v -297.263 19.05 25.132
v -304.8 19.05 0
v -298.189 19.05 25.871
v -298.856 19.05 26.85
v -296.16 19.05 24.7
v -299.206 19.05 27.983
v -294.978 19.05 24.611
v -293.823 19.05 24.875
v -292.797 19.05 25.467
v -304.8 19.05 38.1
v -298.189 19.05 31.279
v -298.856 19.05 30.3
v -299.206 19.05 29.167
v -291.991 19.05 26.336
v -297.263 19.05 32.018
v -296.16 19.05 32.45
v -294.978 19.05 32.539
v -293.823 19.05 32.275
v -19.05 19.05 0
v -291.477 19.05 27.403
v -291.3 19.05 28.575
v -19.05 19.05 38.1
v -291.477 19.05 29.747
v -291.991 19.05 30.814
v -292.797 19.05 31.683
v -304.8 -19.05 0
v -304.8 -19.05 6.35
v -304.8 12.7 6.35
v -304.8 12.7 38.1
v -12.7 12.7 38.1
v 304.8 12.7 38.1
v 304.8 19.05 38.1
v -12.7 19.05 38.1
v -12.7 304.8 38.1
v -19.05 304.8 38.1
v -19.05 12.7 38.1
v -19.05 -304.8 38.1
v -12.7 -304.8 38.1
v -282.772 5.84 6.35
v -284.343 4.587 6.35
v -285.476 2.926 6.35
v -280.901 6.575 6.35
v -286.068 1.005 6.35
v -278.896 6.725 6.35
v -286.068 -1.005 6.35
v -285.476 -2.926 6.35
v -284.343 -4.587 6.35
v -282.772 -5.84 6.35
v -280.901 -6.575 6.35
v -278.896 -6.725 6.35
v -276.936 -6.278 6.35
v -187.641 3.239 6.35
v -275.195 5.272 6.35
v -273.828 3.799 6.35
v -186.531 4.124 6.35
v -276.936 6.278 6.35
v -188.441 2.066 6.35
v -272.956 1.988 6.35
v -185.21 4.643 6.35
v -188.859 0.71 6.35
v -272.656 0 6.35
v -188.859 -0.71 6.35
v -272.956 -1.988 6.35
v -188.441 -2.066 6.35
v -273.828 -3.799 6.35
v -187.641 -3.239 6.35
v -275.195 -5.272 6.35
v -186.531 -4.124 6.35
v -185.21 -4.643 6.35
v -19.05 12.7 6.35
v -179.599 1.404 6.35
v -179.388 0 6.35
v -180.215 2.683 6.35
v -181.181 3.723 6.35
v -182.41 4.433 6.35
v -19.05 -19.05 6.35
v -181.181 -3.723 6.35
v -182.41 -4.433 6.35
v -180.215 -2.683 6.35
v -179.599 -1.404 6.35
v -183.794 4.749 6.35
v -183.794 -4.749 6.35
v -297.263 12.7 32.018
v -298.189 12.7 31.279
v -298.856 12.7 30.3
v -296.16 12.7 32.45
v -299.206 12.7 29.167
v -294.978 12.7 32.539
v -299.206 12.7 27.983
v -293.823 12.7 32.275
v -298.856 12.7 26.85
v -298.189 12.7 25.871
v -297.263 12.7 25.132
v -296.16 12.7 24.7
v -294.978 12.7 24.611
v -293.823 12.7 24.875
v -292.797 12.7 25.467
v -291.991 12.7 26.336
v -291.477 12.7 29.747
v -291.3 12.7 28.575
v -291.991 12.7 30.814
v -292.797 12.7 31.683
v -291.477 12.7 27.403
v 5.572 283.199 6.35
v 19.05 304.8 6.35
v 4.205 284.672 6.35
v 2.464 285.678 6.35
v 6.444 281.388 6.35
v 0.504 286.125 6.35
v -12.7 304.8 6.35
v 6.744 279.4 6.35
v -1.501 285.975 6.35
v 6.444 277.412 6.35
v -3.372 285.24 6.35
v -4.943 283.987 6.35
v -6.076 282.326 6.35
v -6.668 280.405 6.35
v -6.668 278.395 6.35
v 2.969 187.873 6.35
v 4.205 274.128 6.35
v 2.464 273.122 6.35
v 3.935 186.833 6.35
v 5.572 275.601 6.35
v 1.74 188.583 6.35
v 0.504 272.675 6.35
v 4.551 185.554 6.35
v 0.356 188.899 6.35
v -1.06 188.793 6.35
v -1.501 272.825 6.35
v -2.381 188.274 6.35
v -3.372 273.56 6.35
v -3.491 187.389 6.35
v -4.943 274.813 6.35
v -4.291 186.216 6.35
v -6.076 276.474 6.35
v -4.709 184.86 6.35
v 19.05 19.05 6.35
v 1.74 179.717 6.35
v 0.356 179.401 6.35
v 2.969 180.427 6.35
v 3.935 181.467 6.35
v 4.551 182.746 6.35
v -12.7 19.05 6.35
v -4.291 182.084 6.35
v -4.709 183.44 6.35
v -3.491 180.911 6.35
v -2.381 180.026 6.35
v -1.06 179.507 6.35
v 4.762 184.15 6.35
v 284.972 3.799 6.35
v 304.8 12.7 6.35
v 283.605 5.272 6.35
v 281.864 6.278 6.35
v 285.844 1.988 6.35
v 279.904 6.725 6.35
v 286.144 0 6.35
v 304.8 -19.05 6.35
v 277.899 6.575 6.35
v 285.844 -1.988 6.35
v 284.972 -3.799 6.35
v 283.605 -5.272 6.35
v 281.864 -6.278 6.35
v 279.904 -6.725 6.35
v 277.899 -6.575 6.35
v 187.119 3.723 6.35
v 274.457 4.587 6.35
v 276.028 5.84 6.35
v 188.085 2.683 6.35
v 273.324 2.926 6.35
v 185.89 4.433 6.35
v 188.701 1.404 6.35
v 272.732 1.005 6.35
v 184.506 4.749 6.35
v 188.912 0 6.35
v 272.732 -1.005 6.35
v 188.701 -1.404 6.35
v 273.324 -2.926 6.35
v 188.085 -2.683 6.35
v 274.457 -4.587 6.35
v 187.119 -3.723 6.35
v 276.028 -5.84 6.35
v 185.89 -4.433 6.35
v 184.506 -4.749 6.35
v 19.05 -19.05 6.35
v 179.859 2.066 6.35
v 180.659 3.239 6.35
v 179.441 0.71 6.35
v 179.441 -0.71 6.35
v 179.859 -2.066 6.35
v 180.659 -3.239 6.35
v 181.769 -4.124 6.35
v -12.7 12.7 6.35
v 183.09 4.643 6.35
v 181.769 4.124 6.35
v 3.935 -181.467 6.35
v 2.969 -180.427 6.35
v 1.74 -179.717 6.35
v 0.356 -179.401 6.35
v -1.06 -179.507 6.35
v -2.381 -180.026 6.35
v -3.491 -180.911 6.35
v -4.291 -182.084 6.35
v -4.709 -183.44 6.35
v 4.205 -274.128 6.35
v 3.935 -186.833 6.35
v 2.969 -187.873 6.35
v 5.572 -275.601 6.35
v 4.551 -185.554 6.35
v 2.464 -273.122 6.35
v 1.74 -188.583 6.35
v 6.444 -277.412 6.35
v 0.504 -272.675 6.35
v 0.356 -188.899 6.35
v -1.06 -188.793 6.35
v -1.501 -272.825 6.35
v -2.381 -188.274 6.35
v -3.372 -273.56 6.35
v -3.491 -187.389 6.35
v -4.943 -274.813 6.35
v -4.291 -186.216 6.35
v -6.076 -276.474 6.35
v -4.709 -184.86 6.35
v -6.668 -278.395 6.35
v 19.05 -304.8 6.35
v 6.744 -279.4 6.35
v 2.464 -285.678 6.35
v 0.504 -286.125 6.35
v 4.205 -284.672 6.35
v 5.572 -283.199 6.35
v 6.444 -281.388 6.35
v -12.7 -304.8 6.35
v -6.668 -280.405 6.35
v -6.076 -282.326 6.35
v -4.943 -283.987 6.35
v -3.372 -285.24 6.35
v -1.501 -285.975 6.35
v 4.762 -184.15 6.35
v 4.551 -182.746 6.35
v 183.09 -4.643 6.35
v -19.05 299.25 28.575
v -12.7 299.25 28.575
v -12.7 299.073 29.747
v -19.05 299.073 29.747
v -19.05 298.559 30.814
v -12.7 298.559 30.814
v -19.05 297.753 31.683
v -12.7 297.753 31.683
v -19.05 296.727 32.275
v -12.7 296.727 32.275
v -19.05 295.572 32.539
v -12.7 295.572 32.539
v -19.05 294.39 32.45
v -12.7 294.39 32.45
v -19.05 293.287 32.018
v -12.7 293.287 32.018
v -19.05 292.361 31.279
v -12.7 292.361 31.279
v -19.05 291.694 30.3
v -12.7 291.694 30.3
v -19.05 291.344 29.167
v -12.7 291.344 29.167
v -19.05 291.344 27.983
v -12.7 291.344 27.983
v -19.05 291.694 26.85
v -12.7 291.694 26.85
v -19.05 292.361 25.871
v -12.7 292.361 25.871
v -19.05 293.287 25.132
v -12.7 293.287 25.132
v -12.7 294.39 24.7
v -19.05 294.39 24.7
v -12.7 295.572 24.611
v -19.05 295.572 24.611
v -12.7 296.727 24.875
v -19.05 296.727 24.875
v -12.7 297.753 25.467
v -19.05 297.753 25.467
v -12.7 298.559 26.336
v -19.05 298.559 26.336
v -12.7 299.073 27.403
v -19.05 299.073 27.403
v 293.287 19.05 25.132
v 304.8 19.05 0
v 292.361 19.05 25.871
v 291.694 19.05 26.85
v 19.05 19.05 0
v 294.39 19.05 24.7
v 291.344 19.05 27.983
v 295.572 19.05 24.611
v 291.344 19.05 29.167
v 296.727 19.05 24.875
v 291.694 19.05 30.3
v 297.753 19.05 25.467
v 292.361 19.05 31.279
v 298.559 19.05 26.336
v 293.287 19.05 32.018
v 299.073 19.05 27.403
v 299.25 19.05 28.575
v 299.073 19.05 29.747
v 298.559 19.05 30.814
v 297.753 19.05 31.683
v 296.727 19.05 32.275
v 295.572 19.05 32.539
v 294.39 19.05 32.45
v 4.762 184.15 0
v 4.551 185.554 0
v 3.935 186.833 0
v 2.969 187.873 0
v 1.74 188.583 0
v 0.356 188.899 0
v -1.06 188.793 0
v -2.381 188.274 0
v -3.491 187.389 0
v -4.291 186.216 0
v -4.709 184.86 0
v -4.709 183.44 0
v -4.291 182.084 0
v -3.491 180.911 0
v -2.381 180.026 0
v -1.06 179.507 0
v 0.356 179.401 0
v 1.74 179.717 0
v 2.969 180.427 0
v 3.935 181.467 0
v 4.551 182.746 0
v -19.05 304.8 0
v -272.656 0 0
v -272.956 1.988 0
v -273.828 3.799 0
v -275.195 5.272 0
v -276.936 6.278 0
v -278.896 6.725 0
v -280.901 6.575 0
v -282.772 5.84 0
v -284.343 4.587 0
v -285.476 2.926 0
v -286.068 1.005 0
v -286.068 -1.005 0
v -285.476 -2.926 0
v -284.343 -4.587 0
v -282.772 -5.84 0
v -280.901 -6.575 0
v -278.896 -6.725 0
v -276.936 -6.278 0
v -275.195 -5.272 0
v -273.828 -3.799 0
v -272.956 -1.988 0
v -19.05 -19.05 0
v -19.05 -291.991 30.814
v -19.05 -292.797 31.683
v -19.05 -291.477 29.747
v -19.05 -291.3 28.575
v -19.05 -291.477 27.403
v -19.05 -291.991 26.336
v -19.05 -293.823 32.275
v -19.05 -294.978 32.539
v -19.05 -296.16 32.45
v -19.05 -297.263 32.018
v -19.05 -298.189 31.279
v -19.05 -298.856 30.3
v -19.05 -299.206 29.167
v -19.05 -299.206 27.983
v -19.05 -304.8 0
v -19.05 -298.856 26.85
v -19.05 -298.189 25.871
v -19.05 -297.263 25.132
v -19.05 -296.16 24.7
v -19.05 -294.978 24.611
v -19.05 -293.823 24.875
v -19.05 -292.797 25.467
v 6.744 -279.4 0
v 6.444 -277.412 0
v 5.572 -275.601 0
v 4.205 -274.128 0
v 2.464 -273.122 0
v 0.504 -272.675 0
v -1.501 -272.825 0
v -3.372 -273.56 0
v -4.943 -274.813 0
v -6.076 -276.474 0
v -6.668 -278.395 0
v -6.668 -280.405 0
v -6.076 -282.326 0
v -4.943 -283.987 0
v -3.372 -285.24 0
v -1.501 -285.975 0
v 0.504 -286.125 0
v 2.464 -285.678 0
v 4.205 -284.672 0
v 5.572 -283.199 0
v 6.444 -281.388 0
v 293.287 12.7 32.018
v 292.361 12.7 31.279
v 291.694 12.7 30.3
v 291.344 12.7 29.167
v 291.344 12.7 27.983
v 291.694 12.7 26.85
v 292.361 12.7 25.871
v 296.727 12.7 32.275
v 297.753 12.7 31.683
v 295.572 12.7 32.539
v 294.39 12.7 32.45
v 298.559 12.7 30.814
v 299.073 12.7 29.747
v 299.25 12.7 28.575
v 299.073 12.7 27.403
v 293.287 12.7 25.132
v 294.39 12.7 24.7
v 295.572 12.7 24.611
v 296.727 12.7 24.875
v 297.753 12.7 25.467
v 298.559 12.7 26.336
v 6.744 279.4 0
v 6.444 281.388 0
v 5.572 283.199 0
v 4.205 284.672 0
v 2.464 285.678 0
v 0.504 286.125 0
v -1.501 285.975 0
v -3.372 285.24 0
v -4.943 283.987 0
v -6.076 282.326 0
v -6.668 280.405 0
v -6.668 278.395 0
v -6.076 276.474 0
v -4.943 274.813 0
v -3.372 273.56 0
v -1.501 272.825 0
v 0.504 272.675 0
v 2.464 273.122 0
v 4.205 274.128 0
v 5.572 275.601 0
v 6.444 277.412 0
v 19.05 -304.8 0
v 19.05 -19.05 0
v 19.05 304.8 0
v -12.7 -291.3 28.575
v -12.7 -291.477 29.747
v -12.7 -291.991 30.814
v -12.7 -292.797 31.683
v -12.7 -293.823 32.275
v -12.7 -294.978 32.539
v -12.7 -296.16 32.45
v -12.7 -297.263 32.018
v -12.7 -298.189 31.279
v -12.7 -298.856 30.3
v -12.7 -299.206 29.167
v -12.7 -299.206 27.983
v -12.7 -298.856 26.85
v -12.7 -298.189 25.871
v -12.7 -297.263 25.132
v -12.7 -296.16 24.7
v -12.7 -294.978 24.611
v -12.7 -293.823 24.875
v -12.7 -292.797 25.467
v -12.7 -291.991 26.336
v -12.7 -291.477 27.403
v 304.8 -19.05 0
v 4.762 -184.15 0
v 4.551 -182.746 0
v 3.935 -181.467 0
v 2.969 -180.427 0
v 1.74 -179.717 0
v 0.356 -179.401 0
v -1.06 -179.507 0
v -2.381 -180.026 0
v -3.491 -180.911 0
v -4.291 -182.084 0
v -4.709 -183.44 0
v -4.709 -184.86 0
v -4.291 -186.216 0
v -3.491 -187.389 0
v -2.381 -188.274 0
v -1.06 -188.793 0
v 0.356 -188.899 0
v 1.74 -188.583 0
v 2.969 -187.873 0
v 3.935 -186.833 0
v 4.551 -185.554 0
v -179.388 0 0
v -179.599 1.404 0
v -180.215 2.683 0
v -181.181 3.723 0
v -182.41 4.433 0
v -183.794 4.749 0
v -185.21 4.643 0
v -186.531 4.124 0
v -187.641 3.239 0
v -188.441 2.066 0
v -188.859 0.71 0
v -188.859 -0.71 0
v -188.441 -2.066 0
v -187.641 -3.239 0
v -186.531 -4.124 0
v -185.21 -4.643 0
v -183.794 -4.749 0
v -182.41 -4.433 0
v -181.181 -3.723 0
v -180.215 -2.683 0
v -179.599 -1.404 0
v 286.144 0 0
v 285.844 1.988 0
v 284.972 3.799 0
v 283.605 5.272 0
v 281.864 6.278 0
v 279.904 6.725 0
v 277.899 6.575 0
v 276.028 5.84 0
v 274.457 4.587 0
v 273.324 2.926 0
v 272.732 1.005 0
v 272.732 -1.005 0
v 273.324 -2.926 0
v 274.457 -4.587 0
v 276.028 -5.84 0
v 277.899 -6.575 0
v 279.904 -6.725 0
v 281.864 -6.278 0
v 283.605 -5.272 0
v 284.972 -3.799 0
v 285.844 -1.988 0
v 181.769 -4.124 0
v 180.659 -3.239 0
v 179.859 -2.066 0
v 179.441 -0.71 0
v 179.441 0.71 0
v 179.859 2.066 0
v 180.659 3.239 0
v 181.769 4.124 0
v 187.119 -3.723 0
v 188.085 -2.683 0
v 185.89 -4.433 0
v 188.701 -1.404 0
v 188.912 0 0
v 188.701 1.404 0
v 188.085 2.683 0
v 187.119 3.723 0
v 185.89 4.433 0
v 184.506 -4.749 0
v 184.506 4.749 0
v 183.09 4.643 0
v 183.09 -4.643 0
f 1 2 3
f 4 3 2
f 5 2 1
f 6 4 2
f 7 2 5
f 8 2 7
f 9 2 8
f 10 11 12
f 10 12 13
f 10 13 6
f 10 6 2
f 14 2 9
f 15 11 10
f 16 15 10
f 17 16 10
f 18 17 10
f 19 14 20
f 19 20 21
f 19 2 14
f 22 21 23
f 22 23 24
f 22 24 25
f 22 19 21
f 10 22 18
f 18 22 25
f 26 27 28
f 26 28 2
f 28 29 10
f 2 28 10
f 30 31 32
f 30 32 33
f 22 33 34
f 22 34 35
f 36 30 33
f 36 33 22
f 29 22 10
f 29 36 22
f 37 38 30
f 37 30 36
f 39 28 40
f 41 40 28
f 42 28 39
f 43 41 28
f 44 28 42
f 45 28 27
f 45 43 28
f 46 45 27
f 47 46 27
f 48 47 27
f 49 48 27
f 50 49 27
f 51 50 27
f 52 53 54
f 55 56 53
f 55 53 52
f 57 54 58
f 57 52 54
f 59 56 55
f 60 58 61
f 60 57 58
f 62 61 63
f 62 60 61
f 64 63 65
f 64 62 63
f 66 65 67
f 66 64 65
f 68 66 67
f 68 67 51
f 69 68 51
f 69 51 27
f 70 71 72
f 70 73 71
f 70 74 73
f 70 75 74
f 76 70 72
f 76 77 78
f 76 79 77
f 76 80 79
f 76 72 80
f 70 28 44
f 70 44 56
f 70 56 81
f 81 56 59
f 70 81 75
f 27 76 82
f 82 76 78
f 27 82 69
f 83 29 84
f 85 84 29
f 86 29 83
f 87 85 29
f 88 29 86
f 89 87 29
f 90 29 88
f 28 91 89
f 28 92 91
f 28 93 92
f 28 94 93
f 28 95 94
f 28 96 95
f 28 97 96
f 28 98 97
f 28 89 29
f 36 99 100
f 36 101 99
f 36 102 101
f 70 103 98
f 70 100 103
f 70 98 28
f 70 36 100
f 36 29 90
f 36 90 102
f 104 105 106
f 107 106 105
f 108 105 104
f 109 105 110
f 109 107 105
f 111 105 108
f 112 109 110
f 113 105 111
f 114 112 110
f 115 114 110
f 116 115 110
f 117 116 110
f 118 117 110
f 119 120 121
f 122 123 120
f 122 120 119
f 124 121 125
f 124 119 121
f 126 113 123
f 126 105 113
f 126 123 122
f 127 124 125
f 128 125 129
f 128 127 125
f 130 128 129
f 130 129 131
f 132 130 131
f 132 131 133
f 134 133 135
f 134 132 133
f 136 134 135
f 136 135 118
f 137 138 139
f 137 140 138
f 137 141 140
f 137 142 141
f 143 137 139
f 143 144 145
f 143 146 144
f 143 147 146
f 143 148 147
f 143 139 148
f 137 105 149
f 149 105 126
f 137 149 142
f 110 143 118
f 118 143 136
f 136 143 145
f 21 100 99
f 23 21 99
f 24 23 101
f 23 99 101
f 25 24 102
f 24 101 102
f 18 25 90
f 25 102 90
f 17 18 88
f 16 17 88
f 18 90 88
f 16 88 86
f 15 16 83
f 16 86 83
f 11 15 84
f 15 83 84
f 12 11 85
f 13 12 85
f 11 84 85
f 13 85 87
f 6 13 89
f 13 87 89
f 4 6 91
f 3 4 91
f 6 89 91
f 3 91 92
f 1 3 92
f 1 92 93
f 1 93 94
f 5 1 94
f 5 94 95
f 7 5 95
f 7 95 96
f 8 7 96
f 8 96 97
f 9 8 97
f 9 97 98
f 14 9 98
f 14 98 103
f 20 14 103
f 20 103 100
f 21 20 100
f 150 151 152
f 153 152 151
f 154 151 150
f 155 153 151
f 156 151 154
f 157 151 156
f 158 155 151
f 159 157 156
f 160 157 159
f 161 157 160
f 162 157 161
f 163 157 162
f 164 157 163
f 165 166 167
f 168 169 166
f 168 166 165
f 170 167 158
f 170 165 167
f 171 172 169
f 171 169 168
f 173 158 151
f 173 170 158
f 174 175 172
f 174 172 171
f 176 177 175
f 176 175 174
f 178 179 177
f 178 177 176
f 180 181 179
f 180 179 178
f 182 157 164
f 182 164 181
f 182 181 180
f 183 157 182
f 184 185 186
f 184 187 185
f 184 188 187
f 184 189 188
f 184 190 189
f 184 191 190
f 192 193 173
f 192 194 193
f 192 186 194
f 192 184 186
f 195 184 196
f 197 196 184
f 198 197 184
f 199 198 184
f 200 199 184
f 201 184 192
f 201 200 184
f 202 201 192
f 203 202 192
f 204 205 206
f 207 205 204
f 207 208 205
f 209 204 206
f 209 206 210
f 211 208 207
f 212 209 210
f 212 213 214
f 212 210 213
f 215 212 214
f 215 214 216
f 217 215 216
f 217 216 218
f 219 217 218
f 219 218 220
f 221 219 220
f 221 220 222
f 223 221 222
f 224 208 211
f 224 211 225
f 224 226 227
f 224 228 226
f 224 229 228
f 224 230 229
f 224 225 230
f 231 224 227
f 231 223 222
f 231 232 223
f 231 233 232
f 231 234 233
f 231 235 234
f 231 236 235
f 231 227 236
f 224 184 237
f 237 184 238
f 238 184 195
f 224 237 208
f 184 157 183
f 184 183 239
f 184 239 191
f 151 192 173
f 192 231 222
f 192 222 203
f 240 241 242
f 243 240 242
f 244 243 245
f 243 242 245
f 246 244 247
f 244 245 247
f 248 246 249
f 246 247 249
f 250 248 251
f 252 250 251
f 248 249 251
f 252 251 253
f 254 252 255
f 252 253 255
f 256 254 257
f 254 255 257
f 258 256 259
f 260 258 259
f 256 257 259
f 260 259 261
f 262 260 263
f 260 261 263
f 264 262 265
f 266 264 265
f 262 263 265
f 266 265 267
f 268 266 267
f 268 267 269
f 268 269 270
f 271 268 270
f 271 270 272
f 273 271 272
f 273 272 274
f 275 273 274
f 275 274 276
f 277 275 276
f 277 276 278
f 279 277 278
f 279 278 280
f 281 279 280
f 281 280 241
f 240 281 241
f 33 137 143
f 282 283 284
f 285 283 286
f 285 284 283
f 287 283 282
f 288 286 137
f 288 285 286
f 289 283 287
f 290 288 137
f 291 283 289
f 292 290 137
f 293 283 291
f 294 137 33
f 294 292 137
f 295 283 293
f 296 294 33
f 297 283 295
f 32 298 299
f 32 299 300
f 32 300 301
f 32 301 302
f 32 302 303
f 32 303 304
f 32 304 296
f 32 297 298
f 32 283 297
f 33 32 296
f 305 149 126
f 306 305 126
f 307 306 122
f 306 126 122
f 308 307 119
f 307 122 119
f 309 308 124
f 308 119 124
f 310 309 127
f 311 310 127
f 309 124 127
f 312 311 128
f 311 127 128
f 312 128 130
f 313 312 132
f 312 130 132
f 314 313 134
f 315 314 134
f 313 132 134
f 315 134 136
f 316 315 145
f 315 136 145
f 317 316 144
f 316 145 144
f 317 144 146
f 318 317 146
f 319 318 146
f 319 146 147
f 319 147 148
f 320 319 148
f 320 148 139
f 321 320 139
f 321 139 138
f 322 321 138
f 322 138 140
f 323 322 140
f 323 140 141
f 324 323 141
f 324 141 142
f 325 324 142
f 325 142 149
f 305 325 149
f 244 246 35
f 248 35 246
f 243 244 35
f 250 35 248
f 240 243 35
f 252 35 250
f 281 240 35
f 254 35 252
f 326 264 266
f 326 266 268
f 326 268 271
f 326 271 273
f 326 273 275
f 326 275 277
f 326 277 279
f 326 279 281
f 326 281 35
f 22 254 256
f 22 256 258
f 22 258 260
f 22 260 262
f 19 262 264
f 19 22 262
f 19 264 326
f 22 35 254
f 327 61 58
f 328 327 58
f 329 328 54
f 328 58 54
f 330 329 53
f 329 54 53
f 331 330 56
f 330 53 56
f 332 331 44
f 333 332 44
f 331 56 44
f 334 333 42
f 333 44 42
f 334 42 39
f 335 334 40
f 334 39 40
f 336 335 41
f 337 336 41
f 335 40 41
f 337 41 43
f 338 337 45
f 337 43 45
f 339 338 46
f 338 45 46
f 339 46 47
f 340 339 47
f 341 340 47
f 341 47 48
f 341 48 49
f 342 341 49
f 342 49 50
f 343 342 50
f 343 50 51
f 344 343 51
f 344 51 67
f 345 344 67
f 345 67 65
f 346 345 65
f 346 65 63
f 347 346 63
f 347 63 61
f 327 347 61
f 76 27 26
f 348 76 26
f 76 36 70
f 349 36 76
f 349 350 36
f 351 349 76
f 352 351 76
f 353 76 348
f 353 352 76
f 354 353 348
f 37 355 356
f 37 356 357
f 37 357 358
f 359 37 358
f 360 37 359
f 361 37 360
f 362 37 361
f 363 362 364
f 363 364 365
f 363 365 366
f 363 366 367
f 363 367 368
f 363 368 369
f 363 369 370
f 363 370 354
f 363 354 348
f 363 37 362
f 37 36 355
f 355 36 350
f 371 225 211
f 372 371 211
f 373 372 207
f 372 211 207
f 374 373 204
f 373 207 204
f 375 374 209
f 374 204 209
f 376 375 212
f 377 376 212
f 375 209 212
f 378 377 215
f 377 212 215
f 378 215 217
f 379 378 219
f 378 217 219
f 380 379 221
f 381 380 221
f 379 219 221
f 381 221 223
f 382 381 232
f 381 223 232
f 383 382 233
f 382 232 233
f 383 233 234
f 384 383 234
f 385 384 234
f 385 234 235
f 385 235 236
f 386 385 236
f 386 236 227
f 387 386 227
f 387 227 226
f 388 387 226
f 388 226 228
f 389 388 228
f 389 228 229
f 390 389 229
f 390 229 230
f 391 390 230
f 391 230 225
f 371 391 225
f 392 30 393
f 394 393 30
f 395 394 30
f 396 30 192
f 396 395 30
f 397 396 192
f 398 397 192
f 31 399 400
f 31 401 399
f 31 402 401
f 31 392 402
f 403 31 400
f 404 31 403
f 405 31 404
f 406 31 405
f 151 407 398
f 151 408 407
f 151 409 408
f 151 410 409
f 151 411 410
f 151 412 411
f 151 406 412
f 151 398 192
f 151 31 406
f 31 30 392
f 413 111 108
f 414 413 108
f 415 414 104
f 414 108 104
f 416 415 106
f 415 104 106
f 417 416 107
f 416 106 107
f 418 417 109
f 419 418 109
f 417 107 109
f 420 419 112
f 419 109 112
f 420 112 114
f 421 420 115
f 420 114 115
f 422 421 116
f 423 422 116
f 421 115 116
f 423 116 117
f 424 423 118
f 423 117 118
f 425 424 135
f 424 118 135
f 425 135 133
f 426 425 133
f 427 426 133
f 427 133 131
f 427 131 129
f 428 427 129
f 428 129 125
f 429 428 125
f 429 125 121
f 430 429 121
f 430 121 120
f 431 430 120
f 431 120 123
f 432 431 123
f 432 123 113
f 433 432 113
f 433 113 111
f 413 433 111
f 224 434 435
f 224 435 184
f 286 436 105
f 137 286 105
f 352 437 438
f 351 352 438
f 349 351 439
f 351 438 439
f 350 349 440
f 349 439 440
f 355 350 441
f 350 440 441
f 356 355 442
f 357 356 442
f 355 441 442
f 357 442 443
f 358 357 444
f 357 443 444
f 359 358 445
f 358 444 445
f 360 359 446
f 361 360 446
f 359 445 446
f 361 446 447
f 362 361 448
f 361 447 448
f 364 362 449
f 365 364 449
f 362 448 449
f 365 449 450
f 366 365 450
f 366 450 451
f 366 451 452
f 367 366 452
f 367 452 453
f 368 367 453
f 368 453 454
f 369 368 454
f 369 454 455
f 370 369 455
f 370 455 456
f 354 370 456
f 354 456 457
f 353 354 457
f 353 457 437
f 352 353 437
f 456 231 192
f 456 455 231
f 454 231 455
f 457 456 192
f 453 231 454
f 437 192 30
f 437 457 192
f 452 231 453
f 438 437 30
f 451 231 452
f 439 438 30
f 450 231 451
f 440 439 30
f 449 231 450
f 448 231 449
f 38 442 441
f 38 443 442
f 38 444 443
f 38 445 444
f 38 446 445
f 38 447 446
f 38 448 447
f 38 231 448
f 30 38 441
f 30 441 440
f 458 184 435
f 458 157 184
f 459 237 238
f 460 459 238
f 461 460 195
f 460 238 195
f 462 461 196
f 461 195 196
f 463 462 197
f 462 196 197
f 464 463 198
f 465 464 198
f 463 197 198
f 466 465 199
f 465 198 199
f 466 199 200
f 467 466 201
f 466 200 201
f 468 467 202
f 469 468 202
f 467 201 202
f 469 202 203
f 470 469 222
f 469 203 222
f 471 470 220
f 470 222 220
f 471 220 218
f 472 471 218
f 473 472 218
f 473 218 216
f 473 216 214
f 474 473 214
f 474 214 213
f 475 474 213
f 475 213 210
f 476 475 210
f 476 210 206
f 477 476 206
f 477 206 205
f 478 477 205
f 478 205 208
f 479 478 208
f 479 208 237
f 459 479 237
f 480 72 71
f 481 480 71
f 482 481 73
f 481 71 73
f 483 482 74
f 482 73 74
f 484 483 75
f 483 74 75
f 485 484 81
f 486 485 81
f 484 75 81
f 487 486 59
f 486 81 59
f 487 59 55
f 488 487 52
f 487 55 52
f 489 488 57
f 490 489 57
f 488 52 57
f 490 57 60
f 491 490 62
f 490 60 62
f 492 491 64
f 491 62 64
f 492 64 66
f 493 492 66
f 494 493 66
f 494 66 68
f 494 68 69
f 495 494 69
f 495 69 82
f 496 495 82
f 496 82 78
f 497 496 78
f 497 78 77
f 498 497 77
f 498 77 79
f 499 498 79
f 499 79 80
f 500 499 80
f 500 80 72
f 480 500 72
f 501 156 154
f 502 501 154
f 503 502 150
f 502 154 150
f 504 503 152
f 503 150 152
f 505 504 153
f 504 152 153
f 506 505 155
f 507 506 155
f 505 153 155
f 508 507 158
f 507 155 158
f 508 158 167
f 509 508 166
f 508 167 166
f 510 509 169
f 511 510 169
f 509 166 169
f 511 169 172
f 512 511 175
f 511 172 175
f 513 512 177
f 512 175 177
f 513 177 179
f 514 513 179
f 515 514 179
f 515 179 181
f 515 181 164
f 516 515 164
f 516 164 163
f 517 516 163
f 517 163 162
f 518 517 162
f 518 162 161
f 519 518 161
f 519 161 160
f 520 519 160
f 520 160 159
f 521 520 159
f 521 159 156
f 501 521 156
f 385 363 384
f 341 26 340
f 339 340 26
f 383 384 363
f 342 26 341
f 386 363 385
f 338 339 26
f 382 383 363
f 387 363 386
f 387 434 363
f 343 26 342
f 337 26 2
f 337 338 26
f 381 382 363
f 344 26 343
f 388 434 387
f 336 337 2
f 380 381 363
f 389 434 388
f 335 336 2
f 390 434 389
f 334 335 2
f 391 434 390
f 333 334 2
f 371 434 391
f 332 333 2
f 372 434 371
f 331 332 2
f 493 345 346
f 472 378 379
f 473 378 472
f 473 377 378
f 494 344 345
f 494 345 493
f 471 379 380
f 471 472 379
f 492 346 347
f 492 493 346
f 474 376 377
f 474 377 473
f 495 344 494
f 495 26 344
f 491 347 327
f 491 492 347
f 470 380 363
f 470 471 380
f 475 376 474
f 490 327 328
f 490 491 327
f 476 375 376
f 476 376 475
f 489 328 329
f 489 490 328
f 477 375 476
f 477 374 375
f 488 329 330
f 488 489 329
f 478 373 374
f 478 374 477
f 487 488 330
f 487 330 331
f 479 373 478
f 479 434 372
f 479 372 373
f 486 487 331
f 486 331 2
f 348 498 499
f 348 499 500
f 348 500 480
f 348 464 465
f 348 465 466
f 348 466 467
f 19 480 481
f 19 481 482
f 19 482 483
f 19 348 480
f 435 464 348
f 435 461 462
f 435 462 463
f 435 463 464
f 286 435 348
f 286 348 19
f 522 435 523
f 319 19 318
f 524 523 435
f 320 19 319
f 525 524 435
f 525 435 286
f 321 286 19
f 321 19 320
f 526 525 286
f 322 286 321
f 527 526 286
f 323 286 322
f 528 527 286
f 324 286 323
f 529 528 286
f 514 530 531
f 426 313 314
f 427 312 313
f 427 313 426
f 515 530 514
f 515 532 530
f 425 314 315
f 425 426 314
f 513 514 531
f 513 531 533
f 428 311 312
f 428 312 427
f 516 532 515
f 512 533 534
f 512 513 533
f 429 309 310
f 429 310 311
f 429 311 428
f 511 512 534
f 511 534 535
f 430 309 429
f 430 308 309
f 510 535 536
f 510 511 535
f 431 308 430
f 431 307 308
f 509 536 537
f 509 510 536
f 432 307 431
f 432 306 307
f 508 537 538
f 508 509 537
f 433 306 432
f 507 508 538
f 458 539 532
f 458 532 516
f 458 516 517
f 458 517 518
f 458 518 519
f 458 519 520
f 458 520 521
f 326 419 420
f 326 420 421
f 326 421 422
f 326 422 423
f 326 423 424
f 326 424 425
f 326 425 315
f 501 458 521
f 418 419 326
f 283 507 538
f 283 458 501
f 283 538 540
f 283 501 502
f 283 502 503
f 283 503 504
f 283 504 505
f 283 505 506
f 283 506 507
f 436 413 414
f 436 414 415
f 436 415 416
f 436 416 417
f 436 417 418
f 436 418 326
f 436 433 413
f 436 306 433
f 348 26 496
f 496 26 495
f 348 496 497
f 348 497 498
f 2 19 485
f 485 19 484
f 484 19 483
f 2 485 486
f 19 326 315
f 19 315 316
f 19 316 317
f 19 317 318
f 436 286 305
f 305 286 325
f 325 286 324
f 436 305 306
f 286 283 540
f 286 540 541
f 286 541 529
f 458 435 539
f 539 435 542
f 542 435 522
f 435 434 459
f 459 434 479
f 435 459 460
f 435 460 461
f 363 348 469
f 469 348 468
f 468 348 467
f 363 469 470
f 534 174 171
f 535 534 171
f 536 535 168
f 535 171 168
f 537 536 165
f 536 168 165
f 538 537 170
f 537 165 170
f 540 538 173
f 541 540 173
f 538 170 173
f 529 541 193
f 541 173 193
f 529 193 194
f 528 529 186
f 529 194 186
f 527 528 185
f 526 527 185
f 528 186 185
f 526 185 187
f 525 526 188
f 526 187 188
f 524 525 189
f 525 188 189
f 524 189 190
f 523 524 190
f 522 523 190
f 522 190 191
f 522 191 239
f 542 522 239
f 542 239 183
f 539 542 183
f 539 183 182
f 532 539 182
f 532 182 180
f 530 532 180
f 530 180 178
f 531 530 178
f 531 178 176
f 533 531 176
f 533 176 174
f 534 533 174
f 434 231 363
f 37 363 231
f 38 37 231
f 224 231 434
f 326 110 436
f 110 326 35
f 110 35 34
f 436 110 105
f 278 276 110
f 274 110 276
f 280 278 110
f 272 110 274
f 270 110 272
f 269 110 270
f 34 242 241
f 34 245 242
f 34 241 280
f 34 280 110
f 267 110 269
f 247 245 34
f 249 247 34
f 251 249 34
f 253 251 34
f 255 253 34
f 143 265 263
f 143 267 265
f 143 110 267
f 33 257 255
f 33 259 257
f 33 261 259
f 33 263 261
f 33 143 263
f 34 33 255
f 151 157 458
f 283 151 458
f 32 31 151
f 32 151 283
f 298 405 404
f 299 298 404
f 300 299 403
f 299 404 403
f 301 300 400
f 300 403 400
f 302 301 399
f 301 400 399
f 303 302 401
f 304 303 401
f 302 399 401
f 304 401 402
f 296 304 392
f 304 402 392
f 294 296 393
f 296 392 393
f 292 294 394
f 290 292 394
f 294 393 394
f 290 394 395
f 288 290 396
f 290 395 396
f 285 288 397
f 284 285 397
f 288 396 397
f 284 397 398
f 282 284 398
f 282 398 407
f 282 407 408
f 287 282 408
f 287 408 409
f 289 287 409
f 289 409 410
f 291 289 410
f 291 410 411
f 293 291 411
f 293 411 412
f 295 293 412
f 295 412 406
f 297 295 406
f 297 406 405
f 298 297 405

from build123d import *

# Parameters (mm, degrees)
F1_DEPTH  = 304.8
F2_DEPTH  = 304.8
F4_DEPTH  = 304.8
F5_R      = 6.7437
F6_DEPTH  = 6.351
F7_R      = 3.9751
F8_DEPTH  = 292.101
F9_R      = 3.9751
F10_DEPTH = 292.101
F11_R     = 4.7625
F12_DEPTH = 6.351


with BuildPart() as f1:
    # F0 (on Front) → F1 (new body, symmetric)
    with BuildSketch(Plane.XZ):
        Polygon((-12.7, 38.1), (-19.05, 38.1), (-19.05, 0), (19.05, 0), (19.05, 6.35), (-12.7, 6.35), align=None)
    extrude(amount=F1_DEPTH, both=True)

    # F0 (on Front) → F2 (join, symmetric)
    with BuildSketch(Plane.XZ):
        Polygon((-12.7, 38.1), (-19.05, 38.1), (-19.05, 0), (19.05, 0), (19.05, 6.35), (-12.7, 6.35), align=None)
    extrude(amount=F2_DEPTH, both=True)

    # F3 (on Right) → F4 (join, symmetric)
    with BuildSketch(Plane.YZ):
        Polygon((-19.05, 6.35), (-19.05, 0), (19.05, 0), (19.05, 38.1), (12.7, 38.1), (12.7, 6.35), align=None)
    extrude(amount=F4_DEPTH, both=True)

    # F5 (on face) → F6 (cut, through all)
    with BuildSketch(Plane.XY.offset(6.35)):
        with Locations((-279.4, 0)):
            Circle(F5_R)
        with Locations((0, -279.4)):
            Circle(F5_R)
        with Locations((0, 279.4)):
            Circle(F5_R)
        with Locations((279.4, 0)):
            Circle(F5_R)
    extrude(amount=-F6_DEPTH, mode=Mode.SUBTRACT)

    # F7 (on face) → F8 (cut, through all)
    with BuildSketch(Plane.YZ.offset(-12.7)):
        with Locations((295.275, 28.575)):
            Circle(F7_R)
        with Locations((-295.275, 28.575)):
            Circle(F7_R)
    extrude(amount=-F8_DEPTH, mode=Mode.SUBTRACT)

    # F9 (on face) → F10 (cut, through all)
    with BuildSketch(Plane.XZ.offset(-12.7)):
        with Locations((295.275, 28.575)):
            Circle(F9_R)
        with Locations((-295.275, 28.575)):
            Circle(F9_R)
    extrude(amount=-F10_DEPTH, mode=Mode.SUBTRACT)

    # F11 (on face) → F12 (cut, through all)
    with BuildSketch(Plane.XY.offset(6.35)):
        with Locations((0, 184.15)):
            Circle(F11_R)
        with Locations((184.15, 0)):
            Circle(F11_R)
        with Locations((0, -184.15)):
            Circle(F11_R)
        with Locations((-184.15, 0)):
            Circle(F11_R)
    extrude(amount=-F12_DEPTH, mode=Mode.SUBTRACT)


solid = f1.part
